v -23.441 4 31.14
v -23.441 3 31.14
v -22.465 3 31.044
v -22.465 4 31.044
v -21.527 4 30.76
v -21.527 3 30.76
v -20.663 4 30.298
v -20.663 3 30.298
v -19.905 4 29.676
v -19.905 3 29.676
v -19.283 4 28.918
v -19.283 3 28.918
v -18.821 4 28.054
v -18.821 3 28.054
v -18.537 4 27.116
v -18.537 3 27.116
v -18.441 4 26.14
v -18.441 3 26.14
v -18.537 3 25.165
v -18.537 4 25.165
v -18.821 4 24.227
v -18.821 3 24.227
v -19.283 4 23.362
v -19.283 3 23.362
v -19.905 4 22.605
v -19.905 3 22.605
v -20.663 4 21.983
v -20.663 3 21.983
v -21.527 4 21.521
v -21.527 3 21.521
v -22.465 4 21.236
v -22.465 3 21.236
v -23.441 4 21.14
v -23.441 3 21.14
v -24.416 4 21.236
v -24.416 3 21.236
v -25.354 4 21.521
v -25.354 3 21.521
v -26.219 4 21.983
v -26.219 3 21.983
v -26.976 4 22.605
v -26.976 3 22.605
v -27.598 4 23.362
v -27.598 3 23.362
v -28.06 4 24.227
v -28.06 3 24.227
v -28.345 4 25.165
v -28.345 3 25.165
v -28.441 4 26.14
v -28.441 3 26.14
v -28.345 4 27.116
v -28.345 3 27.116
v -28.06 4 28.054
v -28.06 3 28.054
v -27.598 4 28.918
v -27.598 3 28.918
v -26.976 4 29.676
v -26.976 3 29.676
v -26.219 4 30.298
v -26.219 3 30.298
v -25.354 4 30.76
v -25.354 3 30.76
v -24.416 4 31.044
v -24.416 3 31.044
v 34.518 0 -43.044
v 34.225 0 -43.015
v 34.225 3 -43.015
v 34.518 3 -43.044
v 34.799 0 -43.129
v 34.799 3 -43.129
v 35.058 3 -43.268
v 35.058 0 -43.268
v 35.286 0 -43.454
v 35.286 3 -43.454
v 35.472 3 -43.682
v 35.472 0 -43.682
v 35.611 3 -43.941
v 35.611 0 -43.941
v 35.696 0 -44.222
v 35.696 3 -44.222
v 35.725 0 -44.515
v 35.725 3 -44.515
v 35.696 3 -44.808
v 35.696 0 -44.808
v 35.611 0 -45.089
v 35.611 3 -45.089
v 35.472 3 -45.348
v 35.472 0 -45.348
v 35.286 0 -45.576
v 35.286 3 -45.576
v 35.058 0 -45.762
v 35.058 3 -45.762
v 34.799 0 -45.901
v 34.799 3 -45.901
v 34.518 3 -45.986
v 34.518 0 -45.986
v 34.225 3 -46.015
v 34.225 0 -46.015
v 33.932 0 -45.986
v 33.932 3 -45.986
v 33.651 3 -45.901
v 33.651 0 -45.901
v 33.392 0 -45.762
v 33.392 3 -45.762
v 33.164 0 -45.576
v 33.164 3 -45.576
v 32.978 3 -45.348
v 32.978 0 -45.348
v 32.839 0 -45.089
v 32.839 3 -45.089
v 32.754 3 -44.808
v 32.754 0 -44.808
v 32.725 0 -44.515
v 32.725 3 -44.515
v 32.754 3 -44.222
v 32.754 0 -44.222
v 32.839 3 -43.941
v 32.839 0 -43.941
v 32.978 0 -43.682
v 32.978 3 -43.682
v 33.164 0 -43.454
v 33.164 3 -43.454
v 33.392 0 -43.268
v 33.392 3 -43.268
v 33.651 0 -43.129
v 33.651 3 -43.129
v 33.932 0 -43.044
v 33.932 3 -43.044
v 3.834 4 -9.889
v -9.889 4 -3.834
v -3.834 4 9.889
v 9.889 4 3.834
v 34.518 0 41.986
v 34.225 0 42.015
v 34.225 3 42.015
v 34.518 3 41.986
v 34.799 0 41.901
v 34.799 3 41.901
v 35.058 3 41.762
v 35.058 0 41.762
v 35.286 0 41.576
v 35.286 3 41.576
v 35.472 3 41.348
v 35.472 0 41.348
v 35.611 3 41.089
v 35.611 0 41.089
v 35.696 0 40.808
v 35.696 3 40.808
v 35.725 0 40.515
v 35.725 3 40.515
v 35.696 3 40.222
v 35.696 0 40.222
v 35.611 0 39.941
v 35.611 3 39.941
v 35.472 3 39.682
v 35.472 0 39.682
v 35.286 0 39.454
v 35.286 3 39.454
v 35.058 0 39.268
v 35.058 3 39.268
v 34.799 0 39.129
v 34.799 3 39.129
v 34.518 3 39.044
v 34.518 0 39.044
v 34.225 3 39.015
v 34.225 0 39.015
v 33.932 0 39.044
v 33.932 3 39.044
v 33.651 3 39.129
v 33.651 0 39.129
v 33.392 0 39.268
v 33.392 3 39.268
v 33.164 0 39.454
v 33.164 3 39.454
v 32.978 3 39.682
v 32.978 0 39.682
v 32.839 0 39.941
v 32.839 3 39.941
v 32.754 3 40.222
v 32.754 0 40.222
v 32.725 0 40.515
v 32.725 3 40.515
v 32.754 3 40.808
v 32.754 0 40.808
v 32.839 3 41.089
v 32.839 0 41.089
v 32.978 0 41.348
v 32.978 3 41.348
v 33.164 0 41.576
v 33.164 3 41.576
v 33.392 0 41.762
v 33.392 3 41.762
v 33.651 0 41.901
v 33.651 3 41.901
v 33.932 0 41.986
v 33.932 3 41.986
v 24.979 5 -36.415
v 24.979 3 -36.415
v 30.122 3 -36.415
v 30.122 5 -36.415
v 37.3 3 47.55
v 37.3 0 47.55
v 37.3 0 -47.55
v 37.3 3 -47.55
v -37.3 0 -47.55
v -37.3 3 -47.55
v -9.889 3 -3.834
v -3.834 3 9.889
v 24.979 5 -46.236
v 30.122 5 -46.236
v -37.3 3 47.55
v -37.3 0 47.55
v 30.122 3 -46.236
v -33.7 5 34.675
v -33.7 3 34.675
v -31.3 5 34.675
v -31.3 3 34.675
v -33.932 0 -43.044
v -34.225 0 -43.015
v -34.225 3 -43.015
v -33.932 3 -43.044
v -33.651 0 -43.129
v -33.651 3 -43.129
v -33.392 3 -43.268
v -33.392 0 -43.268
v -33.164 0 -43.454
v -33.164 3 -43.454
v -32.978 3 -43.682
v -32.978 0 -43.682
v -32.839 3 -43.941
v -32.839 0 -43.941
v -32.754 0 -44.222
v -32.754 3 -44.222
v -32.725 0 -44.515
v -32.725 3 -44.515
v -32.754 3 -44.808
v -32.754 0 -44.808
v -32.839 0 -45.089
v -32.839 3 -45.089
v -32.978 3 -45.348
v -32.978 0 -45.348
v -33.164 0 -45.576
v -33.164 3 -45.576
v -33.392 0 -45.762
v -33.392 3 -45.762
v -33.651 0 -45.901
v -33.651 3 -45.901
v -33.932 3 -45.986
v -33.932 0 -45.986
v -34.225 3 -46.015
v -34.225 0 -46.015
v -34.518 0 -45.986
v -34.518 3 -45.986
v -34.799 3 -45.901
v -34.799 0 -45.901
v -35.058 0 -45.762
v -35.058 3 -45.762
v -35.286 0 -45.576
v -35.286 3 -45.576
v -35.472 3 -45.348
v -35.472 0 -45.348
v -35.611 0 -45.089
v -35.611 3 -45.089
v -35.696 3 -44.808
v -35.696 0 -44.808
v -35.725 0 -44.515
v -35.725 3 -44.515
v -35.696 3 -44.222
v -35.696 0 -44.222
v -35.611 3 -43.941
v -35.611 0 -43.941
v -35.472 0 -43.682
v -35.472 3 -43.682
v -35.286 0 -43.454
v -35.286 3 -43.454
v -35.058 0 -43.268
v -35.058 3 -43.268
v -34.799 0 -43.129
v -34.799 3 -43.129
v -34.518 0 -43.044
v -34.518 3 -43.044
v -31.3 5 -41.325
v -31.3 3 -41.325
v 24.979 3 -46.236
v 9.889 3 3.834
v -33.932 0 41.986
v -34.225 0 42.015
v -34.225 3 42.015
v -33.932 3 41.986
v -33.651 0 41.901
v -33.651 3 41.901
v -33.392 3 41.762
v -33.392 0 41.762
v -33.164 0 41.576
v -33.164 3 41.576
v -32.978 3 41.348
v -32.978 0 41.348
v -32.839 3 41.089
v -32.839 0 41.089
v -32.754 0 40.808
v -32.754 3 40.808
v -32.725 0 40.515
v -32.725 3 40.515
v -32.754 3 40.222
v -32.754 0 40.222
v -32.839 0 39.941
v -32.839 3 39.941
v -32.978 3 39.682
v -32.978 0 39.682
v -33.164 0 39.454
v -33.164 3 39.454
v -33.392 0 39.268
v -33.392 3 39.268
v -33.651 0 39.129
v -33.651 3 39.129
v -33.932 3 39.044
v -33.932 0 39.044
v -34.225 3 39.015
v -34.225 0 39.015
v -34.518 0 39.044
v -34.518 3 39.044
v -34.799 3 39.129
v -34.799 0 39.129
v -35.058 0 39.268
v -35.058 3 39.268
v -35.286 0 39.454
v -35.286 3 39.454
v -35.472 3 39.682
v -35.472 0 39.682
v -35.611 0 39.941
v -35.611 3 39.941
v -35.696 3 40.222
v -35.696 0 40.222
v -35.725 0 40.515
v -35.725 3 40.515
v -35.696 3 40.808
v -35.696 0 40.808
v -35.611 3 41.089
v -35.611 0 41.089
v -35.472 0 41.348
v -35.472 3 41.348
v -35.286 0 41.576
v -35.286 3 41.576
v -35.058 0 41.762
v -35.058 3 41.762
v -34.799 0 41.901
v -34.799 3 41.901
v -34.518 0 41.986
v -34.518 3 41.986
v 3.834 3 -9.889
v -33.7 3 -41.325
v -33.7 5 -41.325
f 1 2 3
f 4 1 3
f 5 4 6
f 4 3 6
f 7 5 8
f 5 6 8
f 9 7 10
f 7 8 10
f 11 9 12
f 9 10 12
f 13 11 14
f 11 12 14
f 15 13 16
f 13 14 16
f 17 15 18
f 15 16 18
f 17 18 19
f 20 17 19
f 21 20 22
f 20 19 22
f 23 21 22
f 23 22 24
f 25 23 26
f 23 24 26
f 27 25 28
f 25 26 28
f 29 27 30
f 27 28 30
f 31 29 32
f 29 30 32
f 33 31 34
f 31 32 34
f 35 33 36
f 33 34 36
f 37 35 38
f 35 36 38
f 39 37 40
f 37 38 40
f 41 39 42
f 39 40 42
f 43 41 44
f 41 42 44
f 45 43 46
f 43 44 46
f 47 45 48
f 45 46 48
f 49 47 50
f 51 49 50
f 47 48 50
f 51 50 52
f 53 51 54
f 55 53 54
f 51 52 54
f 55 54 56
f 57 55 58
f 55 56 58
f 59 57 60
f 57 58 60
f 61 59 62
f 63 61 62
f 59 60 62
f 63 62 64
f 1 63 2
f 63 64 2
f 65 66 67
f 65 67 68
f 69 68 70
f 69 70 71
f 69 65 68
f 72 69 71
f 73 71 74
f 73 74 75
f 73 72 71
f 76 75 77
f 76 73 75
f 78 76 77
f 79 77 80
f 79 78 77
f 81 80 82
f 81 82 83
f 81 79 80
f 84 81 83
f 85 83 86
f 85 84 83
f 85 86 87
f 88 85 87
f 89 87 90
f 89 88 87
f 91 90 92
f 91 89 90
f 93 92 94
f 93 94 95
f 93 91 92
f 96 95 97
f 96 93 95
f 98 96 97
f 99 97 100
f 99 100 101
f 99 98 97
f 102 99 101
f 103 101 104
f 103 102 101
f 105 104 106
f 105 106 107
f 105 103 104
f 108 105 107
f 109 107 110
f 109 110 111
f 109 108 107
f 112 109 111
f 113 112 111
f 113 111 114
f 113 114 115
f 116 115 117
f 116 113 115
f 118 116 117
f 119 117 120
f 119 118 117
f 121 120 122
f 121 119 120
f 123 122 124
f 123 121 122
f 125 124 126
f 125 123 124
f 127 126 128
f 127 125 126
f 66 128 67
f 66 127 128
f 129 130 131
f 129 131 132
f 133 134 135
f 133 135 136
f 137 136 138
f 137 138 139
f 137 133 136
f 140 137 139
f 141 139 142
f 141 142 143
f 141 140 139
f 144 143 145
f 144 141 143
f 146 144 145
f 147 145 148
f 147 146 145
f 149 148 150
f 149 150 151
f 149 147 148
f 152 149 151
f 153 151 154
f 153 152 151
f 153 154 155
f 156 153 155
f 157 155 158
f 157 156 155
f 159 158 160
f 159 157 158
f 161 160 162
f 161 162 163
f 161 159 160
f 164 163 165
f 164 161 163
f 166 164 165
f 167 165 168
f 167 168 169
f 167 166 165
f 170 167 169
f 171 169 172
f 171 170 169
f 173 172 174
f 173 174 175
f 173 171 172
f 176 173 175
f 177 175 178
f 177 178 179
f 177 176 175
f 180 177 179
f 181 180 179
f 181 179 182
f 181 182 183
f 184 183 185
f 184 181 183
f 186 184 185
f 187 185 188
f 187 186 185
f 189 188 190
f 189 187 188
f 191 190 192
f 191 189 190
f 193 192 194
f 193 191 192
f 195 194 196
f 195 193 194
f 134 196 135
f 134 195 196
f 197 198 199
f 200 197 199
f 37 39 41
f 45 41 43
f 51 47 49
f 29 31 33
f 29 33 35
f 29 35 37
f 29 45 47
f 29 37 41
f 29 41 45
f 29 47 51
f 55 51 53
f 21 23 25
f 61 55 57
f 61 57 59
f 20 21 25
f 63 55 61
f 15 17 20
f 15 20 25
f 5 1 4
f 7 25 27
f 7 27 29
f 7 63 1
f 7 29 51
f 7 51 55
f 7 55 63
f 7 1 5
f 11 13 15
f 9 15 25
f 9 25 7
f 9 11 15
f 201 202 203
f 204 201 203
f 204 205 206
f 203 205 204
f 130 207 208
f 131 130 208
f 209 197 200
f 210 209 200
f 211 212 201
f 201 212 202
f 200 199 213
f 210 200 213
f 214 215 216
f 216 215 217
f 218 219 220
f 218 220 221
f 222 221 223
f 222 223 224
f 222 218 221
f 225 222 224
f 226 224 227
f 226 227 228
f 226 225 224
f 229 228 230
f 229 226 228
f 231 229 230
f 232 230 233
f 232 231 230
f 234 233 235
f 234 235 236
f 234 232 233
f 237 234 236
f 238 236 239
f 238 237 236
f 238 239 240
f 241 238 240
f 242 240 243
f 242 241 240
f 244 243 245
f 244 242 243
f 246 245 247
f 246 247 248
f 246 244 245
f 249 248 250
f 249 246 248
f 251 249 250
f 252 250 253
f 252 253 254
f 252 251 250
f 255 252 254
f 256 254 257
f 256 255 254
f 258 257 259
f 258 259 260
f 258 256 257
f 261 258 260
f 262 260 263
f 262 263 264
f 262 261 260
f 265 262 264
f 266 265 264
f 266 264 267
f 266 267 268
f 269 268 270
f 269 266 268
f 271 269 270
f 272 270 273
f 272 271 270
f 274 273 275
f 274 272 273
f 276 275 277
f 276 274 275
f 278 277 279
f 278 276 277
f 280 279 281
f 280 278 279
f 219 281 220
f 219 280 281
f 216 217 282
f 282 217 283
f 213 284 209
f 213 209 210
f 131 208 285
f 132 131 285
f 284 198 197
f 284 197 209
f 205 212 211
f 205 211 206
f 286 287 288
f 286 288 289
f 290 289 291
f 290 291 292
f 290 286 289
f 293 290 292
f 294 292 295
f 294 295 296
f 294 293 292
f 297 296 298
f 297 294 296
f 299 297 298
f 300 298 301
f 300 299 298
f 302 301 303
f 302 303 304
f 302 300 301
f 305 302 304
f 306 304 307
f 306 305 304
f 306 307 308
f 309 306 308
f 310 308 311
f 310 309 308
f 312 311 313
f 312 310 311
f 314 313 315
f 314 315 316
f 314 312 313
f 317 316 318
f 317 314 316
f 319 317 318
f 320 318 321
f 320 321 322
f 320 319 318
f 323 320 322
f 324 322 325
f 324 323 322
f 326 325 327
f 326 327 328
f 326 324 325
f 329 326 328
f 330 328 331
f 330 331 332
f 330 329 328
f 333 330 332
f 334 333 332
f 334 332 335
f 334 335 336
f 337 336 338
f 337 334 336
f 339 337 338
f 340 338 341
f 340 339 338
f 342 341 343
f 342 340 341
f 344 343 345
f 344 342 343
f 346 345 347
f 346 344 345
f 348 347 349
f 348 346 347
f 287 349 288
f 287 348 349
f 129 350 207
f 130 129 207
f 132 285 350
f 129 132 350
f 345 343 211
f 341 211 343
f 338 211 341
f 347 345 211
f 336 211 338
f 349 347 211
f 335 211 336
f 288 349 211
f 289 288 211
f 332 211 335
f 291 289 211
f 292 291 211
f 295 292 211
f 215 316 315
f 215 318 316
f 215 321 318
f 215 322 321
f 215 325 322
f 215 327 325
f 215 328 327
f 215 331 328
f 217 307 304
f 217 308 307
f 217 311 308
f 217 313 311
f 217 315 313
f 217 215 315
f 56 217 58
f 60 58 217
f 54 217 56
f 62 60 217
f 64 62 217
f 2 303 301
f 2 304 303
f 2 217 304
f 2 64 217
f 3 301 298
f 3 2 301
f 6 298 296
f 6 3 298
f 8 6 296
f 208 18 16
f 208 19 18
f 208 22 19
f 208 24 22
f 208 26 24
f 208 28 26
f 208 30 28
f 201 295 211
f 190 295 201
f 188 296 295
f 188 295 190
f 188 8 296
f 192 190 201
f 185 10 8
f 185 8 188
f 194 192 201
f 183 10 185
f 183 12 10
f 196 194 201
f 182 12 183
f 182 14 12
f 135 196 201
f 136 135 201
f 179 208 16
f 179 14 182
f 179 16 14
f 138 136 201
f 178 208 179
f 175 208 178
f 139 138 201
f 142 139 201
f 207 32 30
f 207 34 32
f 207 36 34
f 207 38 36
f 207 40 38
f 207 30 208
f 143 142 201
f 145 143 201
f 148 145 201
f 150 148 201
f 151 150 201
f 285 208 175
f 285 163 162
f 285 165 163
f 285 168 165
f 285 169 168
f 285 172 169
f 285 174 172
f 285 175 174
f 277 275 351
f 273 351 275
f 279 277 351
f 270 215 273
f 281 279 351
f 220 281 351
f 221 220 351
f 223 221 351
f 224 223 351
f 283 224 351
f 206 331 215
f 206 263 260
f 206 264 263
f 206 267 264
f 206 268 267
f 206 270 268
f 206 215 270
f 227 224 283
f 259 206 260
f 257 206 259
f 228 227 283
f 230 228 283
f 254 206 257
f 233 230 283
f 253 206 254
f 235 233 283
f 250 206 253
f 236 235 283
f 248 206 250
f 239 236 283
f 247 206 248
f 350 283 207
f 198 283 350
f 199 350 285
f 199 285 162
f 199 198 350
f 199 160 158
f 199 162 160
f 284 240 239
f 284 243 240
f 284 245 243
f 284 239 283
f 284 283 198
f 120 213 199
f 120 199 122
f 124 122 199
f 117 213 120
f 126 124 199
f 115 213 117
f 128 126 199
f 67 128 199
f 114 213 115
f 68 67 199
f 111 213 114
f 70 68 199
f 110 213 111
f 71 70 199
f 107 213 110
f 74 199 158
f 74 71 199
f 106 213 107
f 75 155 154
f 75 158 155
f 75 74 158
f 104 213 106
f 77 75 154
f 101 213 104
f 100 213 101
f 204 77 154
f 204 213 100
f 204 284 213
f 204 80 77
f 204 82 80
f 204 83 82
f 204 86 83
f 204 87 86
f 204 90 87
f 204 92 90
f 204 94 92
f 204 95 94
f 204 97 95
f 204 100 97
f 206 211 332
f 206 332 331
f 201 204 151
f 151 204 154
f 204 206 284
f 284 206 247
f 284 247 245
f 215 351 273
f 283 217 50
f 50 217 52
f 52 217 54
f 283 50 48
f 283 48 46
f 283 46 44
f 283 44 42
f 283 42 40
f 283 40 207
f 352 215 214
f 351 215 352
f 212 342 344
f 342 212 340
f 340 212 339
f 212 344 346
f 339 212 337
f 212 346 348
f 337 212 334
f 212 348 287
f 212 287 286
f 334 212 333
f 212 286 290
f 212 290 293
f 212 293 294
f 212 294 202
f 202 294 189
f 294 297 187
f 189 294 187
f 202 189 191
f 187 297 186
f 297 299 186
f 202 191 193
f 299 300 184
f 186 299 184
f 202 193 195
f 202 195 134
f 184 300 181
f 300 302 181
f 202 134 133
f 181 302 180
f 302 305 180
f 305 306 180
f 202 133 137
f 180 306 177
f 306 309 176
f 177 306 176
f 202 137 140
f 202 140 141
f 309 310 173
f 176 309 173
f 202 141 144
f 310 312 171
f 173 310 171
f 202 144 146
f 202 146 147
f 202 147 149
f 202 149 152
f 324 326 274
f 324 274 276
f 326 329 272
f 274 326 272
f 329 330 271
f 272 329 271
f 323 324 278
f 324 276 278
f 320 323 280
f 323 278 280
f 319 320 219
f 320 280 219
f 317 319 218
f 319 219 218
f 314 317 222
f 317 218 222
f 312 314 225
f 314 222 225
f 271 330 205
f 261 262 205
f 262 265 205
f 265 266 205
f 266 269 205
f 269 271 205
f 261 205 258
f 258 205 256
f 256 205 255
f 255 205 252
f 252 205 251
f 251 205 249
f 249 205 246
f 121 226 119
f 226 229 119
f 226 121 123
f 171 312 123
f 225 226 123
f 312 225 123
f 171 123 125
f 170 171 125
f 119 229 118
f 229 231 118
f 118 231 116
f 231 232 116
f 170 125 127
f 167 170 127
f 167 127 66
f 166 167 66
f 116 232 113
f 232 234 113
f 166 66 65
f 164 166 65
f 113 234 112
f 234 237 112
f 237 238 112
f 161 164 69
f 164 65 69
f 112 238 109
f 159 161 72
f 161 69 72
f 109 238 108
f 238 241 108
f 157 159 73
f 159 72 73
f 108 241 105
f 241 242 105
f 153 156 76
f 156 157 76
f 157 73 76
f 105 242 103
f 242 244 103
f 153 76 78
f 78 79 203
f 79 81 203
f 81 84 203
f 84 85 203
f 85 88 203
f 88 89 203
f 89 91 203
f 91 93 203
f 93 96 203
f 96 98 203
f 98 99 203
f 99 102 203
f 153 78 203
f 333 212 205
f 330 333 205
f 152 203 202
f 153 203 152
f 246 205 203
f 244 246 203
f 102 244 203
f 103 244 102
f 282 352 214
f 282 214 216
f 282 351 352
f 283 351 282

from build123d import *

# Parameters (mm, degrees)
SKETCH_1_W      = 74.6
SKETCH_1_H      = 95.1
SKETCH_1_R      = 1.5
EXTRUDE_1_DEPTH = 3
EXTRUDE_2_DEPTH = 1
SKETCH_3_R      = 5
EXTRUDE_3_DEPTH = 1
SKETCH_4_W      = 2.4
SKETCH_4_H      = 76
SKETCH_4_W_2    = 5.142957709
SKETCH_4_H_2    = 9.820324755
EXTRUDE_4_DEPTH = 2


with BuildPart() as part:
    # 草图1 → 凸台-拉伸1 (new body)
    with BuildSketch(Plane(origin=(0, 0, 0), x_dir=(1, 0, 0), z_dir=(0, 1, 0))):
        Rectangle(SKETCH_1_W, SKETCH_1_H)
        with Locations(Location((-34.225, -40.515, 0), (0, 0, 270))):
            Circle(SKETCH_1_R, mode=Mode.SUBTRACT)
        with Locations(Location((-34.225, 44.515, 0), (0, 0, 270))):
            Circle(SKETCH_1_R, mode=Mode.SUBTRACT)
        with Locations(Location((34.225, 44.515, 0), (0, 0, 270))):
            Circle(SKETCH_1_R, mode=Mode.SUBTRACT)
        with Locations(Location((34.225, -40.515, 0), (0, 0, 270))):
            Circle(SKETCH_1_R, mode=Mode.SUBTRACT)
    extrude(amount=EXTRUDE_1_DEPTH)

    # 草图2 → 凸台-拉伸2 (add)
    with BuildSketch(Plane(origin=(0, 3, 0), x_dir=(1, 0, 0), z_dir=(0, 1, 0))):
        Polygon((-9.889416187, 3.833985847), (-3.833985847, -9.889416187), (9.889416187, -3.833985847), (3.833985847, 9.889416187), align=None)
    extrude(amount=EXTRUDE_2_DEPTH)

    # 草图3 → 凸台-拉伸3 (add)
    with BuildSketch(Plane(origin=(0, 3, 0), x_dir=(1, 0, 0), z_dir=(0, 1, 0))):
        with Locations(Location((-23.440659091, -26.14028556, 0), (0, 0, 270))):
            Circle(SKETCH_3_R)
    extrude(amount=EXTRUDE_3_DEPTH)

    # 草图4 → 凸台-拉伸4 (add)
    with BuildSketch(Plane(origin=(0, 3, 0), x_dir=(1, 0, 0), z_dir=(0, 1, 0))):
        with Locations((-32.5, 3.325457596)):
            Rectangle(SKETCH_4_W, SKETCH_4_H)
        with Locations((27.55007403, 41.325457596)):
            Rectangle(SKETCH_4_W_2, SKETCH_4_H_2)
    extrude(amount=EXTRUDE_4_DEPTH)


solid = part.part
